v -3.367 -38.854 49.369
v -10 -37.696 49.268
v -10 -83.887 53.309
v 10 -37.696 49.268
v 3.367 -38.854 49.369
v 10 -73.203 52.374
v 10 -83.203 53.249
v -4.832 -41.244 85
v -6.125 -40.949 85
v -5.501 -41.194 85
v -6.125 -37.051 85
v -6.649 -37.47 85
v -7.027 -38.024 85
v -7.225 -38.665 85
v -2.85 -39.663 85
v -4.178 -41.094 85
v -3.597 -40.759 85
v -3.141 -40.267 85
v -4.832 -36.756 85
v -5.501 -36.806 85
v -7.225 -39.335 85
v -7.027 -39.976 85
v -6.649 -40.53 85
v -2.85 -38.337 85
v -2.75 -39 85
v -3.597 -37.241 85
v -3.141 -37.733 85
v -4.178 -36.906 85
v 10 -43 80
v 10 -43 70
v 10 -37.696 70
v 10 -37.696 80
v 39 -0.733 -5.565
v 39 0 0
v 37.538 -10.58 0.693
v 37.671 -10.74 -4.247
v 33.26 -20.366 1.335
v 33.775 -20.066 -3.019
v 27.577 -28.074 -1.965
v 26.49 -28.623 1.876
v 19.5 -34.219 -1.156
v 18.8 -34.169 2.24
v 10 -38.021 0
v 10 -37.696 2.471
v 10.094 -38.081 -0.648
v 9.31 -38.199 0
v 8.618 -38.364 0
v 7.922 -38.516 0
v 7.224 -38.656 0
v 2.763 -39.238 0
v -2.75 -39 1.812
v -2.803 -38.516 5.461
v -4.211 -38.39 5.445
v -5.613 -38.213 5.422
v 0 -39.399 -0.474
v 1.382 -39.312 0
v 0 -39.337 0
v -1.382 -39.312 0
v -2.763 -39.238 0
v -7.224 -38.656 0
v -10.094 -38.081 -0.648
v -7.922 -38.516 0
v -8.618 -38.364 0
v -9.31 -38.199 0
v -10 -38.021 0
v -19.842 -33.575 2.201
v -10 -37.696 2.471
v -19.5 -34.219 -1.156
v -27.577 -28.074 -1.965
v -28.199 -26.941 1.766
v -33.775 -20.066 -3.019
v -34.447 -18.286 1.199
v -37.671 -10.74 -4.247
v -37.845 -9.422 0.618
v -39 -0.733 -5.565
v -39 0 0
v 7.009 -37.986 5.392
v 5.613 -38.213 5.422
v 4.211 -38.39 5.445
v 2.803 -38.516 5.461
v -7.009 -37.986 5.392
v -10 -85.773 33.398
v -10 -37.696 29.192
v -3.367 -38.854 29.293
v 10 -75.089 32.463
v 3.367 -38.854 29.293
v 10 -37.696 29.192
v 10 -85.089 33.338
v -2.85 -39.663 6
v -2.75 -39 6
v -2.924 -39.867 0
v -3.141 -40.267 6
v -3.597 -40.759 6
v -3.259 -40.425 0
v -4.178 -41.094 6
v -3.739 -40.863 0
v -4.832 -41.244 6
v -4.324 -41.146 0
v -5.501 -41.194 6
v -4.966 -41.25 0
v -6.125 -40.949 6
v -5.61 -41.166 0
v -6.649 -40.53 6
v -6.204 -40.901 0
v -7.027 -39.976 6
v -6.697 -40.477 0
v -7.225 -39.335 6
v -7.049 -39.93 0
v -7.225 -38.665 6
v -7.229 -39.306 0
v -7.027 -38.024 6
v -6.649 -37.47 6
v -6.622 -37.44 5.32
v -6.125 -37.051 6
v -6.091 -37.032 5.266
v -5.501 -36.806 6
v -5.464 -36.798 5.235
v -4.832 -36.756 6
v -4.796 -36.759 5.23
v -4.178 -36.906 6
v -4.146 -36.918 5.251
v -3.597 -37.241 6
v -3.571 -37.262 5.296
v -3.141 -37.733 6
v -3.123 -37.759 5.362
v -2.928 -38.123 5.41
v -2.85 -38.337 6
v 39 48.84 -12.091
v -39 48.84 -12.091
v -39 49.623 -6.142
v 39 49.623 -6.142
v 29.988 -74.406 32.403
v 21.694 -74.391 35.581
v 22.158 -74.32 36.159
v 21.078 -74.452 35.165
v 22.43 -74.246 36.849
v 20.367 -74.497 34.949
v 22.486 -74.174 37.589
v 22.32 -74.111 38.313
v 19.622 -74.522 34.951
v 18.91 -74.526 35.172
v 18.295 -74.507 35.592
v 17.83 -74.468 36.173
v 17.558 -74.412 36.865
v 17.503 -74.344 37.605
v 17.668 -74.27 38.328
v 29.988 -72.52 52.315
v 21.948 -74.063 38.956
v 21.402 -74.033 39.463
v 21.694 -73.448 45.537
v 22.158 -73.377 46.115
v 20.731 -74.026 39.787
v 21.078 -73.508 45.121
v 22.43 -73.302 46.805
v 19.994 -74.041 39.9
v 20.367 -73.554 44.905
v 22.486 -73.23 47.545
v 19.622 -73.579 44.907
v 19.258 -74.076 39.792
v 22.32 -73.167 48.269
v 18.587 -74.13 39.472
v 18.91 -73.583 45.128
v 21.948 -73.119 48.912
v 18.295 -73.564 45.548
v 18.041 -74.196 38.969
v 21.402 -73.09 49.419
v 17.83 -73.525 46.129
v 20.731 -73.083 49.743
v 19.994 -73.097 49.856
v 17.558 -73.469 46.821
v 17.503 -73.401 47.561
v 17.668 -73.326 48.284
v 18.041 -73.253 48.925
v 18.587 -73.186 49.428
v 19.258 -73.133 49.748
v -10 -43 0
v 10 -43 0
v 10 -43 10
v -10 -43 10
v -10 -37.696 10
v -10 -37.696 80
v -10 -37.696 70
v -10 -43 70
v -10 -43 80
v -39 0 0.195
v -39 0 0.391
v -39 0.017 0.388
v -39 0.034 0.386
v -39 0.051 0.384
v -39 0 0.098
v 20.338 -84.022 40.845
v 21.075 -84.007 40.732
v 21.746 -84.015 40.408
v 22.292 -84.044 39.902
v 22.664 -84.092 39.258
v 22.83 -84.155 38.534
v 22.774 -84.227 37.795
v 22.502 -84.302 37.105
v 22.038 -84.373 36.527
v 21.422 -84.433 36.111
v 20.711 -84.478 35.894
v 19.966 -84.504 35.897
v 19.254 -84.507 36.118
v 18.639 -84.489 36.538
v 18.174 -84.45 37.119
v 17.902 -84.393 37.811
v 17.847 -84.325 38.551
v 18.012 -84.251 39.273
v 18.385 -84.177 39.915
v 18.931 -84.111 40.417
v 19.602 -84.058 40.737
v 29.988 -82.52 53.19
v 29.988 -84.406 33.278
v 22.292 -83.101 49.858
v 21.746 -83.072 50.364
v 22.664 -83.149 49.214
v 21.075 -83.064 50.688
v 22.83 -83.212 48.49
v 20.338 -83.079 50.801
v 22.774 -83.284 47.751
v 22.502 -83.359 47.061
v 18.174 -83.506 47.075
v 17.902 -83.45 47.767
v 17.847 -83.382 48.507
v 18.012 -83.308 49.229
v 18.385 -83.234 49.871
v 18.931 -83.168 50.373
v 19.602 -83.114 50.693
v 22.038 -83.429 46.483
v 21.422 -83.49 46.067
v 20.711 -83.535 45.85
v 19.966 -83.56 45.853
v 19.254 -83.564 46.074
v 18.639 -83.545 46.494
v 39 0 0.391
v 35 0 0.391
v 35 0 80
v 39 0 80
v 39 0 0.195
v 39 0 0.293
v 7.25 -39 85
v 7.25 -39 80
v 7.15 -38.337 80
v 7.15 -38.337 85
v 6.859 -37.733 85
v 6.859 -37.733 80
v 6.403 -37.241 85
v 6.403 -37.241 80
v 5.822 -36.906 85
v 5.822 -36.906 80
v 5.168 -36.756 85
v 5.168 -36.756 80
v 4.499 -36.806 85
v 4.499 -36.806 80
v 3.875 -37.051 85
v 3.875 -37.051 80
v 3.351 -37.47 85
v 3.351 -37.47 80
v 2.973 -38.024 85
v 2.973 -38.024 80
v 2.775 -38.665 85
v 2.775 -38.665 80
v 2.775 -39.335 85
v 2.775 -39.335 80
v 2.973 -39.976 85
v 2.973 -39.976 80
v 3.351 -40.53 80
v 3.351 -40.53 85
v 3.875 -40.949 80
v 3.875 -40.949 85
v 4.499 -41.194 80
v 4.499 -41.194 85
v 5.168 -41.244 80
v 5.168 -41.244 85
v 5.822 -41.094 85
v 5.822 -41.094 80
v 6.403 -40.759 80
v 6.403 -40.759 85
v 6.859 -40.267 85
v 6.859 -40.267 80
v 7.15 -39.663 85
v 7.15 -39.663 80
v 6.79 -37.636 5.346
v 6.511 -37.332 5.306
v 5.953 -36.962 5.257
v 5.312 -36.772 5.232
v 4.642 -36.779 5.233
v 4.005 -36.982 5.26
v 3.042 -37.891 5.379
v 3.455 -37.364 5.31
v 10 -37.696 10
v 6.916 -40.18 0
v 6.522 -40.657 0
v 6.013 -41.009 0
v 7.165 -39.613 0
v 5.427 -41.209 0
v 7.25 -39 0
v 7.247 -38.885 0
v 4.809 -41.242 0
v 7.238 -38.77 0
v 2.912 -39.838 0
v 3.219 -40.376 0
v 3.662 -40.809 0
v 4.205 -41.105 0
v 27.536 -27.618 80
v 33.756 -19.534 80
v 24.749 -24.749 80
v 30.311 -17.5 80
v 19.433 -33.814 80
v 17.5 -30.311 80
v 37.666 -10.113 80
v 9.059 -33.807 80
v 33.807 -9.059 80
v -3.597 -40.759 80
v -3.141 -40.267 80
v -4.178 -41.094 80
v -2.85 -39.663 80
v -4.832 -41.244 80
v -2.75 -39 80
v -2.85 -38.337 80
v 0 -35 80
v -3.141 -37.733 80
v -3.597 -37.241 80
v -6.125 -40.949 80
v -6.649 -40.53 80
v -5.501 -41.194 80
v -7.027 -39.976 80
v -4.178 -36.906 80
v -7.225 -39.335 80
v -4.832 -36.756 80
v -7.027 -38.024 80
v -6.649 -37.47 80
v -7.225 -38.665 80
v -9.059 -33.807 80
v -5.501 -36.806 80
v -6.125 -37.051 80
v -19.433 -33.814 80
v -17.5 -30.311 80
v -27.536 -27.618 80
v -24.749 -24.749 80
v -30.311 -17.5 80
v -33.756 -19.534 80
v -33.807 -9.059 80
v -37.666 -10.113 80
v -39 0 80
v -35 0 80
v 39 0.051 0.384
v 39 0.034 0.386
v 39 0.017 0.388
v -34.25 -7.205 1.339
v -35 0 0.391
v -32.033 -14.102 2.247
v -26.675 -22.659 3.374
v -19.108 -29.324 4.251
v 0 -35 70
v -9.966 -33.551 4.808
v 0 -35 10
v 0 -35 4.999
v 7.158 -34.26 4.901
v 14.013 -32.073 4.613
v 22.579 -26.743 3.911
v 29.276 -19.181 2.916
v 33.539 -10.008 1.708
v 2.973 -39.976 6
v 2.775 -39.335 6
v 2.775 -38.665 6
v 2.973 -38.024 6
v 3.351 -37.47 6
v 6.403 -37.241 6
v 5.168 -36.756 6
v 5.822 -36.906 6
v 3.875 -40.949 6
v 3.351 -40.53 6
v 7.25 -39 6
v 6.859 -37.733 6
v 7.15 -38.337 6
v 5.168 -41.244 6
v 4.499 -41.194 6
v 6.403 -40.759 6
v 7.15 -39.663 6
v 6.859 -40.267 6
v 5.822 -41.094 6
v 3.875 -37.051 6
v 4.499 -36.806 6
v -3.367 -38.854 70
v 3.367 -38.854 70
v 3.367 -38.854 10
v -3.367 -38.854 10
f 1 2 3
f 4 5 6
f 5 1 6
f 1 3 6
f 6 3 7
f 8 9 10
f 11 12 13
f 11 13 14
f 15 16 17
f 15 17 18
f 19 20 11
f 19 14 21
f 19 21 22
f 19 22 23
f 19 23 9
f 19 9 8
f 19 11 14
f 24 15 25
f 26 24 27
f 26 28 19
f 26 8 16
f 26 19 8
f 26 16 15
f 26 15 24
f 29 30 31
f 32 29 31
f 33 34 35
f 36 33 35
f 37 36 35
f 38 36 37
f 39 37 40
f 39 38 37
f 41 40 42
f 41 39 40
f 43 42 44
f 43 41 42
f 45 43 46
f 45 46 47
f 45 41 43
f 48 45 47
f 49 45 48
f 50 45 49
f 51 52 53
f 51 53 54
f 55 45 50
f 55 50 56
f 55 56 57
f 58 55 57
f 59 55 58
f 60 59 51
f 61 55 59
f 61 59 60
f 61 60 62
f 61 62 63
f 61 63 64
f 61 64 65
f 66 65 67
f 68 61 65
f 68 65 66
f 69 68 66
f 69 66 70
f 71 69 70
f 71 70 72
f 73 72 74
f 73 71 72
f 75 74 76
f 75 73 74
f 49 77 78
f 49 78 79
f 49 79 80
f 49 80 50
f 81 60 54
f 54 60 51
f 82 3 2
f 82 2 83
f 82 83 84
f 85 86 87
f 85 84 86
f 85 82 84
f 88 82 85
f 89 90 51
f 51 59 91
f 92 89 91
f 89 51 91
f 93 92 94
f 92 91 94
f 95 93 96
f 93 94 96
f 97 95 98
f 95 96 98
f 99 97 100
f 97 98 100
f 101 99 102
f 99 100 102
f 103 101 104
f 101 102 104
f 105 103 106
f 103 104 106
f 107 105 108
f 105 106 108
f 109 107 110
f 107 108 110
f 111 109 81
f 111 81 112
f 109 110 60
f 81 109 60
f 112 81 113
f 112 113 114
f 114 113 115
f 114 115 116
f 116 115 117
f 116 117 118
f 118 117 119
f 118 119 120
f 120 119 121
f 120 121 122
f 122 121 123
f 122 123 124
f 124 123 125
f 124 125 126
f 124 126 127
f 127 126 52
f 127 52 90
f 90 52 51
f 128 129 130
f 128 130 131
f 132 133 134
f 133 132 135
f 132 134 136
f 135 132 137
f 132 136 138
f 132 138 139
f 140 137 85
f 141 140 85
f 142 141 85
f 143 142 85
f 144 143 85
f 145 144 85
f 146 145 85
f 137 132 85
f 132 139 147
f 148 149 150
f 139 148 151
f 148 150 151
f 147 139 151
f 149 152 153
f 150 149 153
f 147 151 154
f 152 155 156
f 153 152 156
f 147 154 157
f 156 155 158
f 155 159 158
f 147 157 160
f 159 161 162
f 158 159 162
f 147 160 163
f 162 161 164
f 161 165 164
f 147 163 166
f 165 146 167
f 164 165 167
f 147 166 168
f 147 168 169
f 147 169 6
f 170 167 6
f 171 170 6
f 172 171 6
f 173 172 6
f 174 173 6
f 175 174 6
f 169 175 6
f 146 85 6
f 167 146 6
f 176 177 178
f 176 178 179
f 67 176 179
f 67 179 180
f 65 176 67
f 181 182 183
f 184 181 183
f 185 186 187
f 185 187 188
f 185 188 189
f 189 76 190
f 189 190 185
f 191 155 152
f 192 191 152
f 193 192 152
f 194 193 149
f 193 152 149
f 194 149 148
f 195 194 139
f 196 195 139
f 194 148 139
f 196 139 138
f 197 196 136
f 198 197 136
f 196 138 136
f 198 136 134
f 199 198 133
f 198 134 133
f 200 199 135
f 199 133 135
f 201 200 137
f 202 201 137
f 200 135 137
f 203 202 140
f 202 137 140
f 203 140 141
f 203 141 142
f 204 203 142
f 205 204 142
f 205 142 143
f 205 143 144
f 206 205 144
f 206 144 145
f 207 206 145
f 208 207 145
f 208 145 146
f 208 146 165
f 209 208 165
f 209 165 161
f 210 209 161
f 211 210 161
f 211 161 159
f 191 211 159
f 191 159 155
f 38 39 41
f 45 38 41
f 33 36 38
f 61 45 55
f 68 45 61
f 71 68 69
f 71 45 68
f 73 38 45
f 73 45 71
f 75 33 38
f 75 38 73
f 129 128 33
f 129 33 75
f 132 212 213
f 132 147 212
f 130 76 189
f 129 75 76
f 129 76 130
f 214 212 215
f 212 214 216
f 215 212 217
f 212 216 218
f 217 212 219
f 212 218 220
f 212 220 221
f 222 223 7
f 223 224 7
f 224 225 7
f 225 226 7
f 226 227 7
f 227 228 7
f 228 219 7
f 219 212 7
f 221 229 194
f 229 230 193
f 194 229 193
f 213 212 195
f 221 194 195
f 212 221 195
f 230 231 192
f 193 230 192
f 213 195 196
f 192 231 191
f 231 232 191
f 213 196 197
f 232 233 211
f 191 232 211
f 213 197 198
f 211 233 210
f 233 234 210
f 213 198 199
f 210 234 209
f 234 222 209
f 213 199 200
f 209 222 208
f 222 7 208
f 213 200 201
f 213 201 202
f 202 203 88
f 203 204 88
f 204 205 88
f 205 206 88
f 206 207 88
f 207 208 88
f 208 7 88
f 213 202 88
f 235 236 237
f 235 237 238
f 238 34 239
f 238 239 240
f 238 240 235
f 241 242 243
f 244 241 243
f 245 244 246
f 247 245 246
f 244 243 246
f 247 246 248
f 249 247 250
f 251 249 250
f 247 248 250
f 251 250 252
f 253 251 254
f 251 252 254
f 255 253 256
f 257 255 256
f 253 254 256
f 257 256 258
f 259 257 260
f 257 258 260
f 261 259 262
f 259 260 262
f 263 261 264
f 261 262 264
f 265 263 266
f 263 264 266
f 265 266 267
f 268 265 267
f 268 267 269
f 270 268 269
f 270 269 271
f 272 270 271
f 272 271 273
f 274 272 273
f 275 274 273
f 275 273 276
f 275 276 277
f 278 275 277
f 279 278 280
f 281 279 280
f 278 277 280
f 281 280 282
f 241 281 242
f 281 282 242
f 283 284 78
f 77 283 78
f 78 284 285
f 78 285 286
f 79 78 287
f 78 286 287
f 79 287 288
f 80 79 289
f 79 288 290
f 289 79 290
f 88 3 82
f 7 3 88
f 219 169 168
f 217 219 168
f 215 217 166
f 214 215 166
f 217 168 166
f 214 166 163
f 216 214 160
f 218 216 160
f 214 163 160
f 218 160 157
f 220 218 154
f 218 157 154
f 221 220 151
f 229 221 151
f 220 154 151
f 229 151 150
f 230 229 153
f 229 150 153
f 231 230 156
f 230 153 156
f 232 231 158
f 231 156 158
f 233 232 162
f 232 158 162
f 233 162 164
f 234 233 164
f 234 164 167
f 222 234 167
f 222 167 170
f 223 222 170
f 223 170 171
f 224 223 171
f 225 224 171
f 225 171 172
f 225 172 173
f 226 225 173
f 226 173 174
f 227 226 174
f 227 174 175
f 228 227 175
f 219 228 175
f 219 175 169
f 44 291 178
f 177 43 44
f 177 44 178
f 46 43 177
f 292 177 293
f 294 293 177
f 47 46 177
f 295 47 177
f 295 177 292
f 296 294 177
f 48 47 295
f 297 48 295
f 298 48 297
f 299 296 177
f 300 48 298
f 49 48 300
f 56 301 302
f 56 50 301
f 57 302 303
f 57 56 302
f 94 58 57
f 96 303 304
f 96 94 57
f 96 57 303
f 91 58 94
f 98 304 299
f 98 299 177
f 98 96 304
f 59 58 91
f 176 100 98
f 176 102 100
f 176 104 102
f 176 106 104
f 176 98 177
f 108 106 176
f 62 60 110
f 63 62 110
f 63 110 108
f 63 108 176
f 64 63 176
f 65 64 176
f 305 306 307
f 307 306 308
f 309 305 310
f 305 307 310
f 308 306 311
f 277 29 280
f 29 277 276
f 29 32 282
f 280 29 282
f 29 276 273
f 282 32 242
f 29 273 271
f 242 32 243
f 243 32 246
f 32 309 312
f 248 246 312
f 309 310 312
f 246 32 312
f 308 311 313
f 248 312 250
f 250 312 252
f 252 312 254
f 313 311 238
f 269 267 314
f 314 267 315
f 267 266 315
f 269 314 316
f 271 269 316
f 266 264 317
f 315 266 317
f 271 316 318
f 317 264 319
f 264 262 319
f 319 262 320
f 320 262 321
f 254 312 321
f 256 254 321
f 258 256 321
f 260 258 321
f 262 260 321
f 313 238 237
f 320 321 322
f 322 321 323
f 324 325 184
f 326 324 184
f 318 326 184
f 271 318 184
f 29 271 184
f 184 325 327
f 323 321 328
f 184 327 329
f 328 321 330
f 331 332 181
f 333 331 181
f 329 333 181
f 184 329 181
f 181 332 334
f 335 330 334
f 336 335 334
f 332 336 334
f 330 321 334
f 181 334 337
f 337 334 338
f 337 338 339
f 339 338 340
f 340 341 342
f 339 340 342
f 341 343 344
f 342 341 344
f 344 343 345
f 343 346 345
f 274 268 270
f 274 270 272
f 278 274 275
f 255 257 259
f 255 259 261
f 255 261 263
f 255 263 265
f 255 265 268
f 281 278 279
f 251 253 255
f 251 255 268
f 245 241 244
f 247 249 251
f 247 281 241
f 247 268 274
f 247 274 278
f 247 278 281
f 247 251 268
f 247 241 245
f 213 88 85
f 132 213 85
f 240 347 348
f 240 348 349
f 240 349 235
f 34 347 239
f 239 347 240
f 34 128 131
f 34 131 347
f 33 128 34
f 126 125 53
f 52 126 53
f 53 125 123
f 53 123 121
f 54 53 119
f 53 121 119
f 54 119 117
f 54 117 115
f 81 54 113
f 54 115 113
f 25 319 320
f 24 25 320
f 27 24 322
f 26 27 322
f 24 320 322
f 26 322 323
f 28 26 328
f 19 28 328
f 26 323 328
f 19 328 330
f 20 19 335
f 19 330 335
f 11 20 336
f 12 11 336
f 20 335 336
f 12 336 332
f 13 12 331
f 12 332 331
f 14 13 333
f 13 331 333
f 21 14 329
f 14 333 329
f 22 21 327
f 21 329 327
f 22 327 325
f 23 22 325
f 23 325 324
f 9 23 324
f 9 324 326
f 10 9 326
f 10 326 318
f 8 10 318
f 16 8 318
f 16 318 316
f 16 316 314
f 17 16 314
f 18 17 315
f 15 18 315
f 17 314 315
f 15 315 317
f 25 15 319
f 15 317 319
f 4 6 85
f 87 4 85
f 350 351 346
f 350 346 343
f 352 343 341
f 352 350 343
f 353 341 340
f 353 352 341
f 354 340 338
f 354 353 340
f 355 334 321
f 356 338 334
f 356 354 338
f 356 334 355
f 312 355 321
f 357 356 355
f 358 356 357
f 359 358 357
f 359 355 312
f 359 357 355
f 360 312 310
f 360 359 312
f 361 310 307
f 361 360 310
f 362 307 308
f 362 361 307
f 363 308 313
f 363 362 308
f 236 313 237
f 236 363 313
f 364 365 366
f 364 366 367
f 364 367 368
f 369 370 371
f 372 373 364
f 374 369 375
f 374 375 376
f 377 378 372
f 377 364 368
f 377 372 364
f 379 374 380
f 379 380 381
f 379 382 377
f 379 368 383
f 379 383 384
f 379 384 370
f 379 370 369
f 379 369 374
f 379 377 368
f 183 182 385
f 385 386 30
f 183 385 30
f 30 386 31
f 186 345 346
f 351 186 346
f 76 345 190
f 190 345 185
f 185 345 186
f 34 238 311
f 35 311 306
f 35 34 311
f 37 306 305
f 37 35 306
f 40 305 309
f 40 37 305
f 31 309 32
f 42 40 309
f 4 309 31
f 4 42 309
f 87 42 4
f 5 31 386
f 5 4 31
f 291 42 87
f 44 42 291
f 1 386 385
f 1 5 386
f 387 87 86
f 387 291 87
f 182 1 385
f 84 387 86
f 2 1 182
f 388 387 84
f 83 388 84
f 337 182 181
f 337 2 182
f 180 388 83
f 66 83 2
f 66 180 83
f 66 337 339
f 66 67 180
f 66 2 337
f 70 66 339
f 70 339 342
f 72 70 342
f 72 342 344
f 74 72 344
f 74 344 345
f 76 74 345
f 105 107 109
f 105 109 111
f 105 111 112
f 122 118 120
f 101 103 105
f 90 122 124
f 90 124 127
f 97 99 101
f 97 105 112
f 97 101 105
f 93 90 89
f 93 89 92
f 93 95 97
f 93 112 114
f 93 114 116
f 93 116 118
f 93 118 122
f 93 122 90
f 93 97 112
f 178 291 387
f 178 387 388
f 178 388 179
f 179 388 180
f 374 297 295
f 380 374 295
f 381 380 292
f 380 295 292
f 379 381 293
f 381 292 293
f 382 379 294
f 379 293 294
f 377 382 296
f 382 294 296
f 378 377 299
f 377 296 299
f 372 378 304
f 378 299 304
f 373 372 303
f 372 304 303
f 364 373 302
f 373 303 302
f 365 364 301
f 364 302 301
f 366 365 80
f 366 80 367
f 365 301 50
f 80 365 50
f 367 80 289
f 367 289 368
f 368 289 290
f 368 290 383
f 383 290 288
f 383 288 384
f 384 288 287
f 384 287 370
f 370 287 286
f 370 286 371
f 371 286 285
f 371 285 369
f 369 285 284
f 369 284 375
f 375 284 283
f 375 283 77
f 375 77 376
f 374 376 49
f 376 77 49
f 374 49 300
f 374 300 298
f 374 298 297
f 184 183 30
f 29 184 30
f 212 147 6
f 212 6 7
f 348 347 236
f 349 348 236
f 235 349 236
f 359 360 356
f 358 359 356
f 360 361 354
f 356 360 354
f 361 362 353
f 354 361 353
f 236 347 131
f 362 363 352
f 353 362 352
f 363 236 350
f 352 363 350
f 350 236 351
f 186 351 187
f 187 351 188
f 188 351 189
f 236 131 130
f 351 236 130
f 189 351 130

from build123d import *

# Parameters (mm, degrees)
EXTRUDE_THIN1_DEPTH       = 80
BOSS_EXTRUDE1_START       = -10
BOSS_EXTRUDE1_DEPTH       = 10
SKETCH3_R                 = 2.25
BOSS_EXTRUDE2_DEPTH       = 5
BOSS_EXTRUDE3_DEPTH       = 10
SKETCH5_R                 = 2.25
CUT_EXTRUDE1_DEPTH        = 6
BOSS_EXTRUDE4_REACH       = 104.415
BOSS_EXTRUDE4_END_RADIUS  = 39
SKETCH10_W                = 20
SKETCH10_H                = 20
BOSS_EXTRUDE6_DEPTH       = 6
BOSS_EXTRUDE7_START       = -38.548677333
BOSS_EXTRUDE7_OUTLINE_W   = 20
BOSS_EXTRUDE7_OUTLINE_H   = 20
BOSS_EXTRUDE7_DEPTH       = 38.548677333
BOSS_EXTRUDE7_START_2     = 88.145703723
BOSS_EXTRUDE7_2_OUTLINE_W = 23
BOSS_EXTRUDE7_2_OUTLINE_H = 23
BOSS_EXTRUDE7_2_DEPTH     = 1.854296277
BOSS_EXTRUDE9_DEPTH       = 20
SKETCH16_R                = 2.5
CUT_EXTRUDE2_DEPTH        = 20


with BuildPart() as part:
    # Sketch1 → Extrude-Thin1 (new body)
    with BuildSketch(Plane.XY):
        with BuildLine():
            ThreePointArc((-35, 0), (0, -35), (35, 0))
            Line((35, 0), (39, 0))
            ThreePointArc((39, 0), (0, -39), (-39, 0))
            Line((-39, 0), (-35, 0))
        make_face()
    extrude(amount=EXTRUDE_THIN1_DEPTH)

    # Sketch2 → Boss-Extrude1 (add)
    with BuildSketch(Plane.XY.offset(80).offset(BOSS_EXTRUDE1_START)):
        with BuildLine():
            Line((0, -39), (0, -35))
            Line((0, -35), (-10, -35))
            Line((-10, -35), (-10, -37.69615365))
            ThreePointArc((-10, -37.69615365), (-5.042321274, -38.672664715), (0, -39))
        make_face()
        with BuildLine():
            Line((10, -35), (0, -35))
            Line((0, -35), (0, -39))
            ThreePointArc((0, -39), (5.042321274, -38.672664715), (10, -37.69615365))
            Line((10, -37.69615365), (10, -35))
        make_face()
        with BuildLine():
            ThreePointArc((10, -37.69615365), (5.042321274, -38.672664715), (0, -39))
            ThreePointArc((0, -39), (-5.042321274, -38.672664715), (-10, -37.69615365))
            Line((-10, -37.69615365), (-10, -43))
            Line((-10, -43), (10, -43))
            Line((10, -43), (10, -37.69615365))
        make_face()
    extrude(amount=BOSS_EXTRUDE1_DEPTH)

    # Sketch3 → Boss-Extrude2 (add)
    with BuildSketch(Plane.XY.offset(80)):
        with Locations((-5, -39)):
            Circle(SKETCH3_R)
        with Locations((5, -39)):
            Circle(SKETCH3_R)
    extrude(amount=BOSS_EXTRUDE2_DEPTH)

    # Sketch4 → Boss-Extrude3 (add)
    with BuildSketch(Plane(origin=(0, 0, 0), x_dir=(-1, 0, 0), z_dir=(0, 0, -1))):
        with BuildLine():
            Line((0, -39), (0, -35))
            Line((0, -35), (-10, -35))
            Line((-10, -35), (-10, -37.69615365))
            ThreePointArc((-10, -37.69615365), (-5.042321274, -38.672664715), (0, -39))
        make_face()
        with BuildLine():
            ThreePointArc((10, -37.69615365), (5.042321274, -38.672664715), (0, -39))
            ThreePointArc((0, -39), (-5.042321274, -38.672664715), (-10, -37.69615365))
            Line((-10, -37.69615365), (-10, -43))
            Line((-10, -43), (10, -43))
            Line((10, -43), (10, -37.69615365))
        make_face()
        with BuildLine():
            Line((10, -35), (0, -35))
            Line((0, -35), (0, -39))
            ThreePointArc((0, -39), (5.042321274, -38.672664715), (10, -37.69615365))
            Line((10, -37.69615365), (10, -35))
        make_face()
    extrude(amount=-BOSS_EXTRUDE3_DEPTH)

    # Sketch5 → Cut-Extrude1 (cut)
    with BuildSketch(Plane(origin=(0, 0, 0), x_dir=(-1, 0, 0), z_dir=(0, 0, -1))):
        with Locations(Location((-5, -39, 0), (0, 0, 180))):
            Circle(SKETCH5_R)
        with Locations(Location((5, -39, 0), (0, 0, 180))):
            Circle(SKETCH5_R)
    extrude(amount=-CUT_EXTRUDE1_DEPTH, mode=Mode.SUBTRACT)

    # Boss-Extrude4: up to this cylinder (the profile starts outside it)
    boss_extrude4_end = Plane(origin=(0, 0, 40), z_dir=(0, 0, -1)) * Cylinder(BOSS_EXTRUDE4_END_RADIUS, 287.83, mode=Mode.PRIVATE)
    # Sketch10 → Boss-Extrude4 (add, up to the surface)
    with BuildSketch(Plane(origin=(0, -49.619293796, 4.341125699), x_dir=(1, 0, 0), z_dir=(0, 0.9961946980917462, -0.08715574274765152)), mode=Mode.PRIVATE) as boss_extrude4_sk1:
        with Locations((0, -35.795085407)):
            Rectangle(SKETCH10_W, SKETCH10_H)
    boss_extrude4_tool1 = extrude(boss_extrude4_sk1.sketch, amount=BOSS_EXTRUDE4_REACH, mode=Mode.PRIVATE) - boss_extrude4_end
    add(boss_extrude4_tool1.solids().sort_by_distance((0, -46.499547, 40))[0])

    # Sketch14 → Boss-Extrude6 (add)
    with BuildSketch(Plane(origin=(0, -0.732594735, -5.56460947), x_dir=(1, 0, 0), z_dir=(0, 0.130526192220045, 0.9914448613738114))):
        with BuildLine():
            Line((-39, 0), (-39, 50))
            Line((-39, 50), (39, 50))
            Line((39, 50), (39, 0))
            ThreePointArc((39, 0), (0, -39), (-39, 0))
        make_face()
    extrude(amount=BOSS_EXTRUDE6_DEPTH)

    # Boss-Extrude7: read off the stored shape, not the designer's step
    # Boss-Extrude7 outline → Boss-Extrude7 (add)
    with BuildSketch(Plane(origin=(0, -49.619293796, 4.341125699), x_dir=(1, 0, 0), z_dir=(0, 0.9961946980917462, -0.08715574274765152)).offset(BOSS_EXTRUDE7_START)):
        with Locations((0, -35.795085407)):
            Rectangle(BOSS_EXTRUDE7_OUTLINE_W, BOSS_EXTRUDE7_OUTLINE_H)
    extrude(amount=BOSS_EXTRUDE7_DEPTH)

    # Boss-Extrude7 2 outline → Boss-Extrude7 2 (cut)
    with BuildSketch(Plane(origin=(0, 0, 0), x_dir=(0.9994119135527714, 0.03413748045727771, -0.003234111441613329), z_dir=(0.0342903346263607, -0.9949568891477218, 0.09426007473315608)).offset(BOSS_EXTRUDE7_START_2)):
        with Locations((-3.5, 35.5)):
            Rectangle(BOSS_EXTRUDE7_2_OUTLINE_W, BOSS_EXTRUDE7_2_OUTLINE_H)
    extrude(amount=BOSS_EXTRUDE7_2_DEPTH, mode=Mode.SUBTRACT)

    # Sketch15 → Boss-Extrude9 (add, along a direction that is not the sketch's normal)
    with BuildSketch(Plane(origin=(10, 0, 0), x_dir=(0, 0, -1), z_dir=(1, 0, 0))):
        Polygon((-53.249344589, -83.203115712), (-33.337982915, -85.089475272), (-32.46309628, -75.089475272), (-52.374457954, -73.203115712), align=None)
    extrude(amount=BOSS_EXTRUDE9_DEPTH, dir=(0.9994118831812419, 0.034160731366783506, -0.0029886767323038838))

    # Sketch16 → Cut-Extrude2 (cut)
    with BuildSketch(Plane(origin=(2.678543813, -77.719732066, 7.363000179), x_dir=(0.9994101830326216, 0.03396190638807467, -0.005086744065644862), z_dir=(-0.03429033462636075, 0.9949568891477218, -0.0942600747331567))):
        with Locations(Location((17.250851161, -40.271437351, 0), (0, 0, 269.893376297))):
            Circle(SKETCH16_R)
        with Locations(Location((17.269461459, -30.270938076, 0), (0, 0, 269.893376297))):
            Circle(SKETCH16_R)
    extrude(amount=-CUT_EXTRUDE2_DEPTH, mode=Mode.SUBTRACT)


solid = part.part
